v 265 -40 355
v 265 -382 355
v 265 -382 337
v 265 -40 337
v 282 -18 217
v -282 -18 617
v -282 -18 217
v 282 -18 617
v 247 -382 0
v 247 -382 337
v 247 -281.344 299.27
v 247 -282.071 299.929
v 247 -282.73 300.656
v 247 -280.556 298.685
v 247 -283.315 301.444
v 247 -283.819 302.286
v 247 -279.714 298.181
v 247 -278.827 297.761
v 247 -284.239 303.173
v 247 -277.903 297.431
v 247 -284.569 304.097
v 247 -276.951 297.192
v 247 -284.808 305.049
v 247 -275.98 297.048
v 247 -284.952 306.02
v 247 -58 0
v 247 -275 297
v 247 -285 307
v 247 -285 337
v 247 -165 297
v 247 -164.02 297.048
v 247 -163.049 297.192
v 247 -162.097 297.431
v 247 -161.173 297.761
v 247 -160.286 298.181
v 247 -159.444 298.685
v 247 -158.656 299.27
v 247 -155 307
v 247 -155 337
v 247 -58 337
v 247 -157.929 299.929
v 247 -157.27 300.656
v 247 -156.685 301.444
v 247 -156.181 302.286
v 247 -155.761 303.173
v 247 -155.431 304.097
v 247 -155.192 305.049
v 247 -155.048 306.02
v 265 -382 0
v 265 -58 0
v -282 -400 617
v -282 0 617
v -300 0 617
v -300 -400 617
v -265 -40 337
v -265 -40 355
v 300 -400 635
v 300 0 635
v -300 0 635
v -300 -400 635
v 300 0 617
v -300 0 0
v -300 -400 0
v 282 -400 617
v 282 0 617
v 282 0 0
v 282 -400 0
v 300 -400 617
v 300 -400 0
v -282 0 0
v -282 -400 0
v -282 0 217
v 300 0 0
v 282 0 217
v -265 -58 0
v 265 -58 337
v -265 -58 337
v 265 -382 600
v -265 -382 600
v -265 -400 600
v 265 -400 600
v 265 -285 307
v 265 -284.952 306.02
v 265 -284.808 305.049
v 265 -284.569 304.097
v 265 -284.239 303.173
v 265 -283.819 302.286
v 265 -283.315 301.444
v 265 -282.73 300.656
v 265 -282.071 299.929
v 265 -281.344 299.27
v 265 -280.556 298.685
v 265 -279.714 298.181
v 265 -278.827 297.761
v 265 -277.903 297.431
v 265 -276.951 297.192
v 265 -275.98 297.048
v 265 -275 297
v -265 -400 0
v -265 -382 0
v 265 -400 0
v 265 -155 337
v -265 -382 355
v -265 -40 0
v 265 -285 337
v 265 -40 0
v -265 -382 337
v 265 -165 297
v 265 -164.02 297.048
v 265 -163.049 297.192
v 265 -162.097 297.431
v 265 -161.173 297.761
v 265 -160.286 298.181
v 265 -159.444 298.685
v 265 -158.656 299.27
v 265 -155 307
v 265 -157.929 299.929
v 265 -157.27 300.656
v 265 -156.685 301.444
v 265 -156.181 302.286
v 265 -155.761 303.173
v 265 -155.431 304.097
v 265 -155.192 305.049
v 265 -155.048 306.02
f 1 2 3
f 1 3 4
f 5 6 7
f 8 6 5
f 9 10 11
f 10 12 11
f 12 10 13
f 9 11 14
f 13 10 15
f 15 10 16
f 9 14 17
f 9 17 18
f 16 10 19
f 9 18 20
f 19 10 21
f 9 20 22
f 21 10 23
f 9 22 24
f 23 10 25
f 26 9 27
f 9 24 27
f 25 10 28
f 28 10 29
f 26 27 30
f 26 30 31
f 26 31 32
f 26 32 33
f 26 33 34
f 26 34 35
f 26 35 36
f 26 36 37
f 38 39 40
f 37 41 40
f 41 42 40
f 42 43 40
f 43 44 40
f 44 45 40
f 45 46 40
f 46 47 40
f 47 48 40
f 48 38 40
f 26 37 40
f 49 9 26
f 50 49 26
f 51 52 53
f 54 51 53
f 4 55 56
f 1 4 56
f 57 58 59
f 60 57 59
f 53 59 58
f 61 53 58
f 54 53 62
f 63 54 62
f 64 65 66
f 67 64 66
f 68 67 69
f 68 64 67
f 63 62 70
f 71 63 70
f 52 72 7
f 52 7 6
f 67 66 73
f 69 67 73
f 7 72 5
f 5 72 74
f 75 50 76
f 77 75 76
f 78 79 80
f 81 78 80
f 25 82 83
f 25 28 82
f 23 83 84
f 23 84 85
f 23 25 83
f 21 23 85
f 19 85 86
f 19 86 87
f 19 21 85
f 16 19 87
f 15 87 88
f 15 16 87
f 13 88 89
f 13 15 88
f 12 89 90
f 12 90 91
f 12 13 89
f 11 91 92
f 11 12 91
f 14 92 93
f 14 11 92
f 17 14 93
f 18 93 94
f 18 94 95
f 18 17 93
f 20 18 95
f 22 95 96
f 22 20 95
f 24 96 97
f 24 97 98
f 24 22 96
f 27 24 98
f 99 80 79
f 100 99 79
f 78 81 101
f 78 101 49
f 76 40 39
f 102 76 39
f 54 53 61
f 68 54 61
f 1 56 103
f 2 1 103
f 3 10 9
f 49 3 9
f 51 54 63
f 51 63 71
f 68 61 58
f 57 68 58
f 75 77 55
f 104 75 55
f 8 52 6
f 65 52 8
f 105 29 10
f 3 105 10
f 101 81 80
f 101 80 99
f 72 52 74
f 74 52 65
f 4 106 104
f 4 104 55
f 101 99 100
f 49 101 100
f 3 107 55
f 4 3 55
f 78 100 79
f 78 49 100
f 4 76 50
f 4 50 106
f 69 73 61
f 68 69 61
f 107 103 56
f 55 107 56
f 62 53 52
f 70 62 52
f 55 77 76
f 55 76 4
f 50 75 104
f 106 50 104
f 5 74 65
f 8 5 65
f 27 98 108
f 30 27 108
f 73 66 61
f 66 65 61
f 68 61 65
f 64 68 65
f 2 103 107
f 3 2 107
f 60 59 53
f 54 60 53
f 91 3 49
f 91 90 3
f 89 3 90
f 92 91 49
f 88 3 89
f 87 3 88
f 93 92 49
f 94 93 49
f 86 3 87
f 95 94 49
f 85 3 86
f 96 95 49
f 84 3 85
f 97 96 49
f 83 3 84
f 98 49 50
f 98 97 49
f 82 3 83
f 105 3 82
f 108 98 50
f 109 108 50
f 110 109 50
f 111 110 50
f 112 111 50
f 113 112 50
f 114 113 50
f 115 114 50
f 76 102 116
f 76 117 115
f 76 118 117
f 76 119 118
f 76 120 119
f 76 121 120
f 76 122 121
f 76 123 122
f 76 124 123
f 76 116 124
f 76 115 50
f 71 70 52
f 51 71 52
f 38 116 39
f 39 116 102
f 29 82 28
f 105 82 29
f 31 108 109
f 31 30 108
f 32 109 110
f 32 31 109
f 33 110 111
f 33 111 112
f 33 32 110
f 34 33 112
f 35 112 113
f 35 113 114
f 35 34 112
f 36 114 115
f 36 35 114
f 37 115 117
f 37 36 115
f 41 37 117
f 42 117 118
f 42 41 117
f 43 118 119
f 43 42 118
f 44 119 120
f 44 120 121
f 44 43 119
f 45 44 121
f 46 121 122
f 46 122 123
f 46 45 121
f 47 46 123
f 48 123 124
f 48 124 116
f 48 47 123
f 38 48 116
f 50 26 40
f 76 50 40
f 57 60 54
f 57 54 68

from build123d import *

# Parameters (mm, degrees)
F1_DEPTH  = 400
F2_DEPTH  = 400
F3_DEPTH  = 400
F0_W      = 564
F0_H      = 400
F4_DEPTH  = 18
F6_DEPTH  = 265
F7_DEPTH  = 265
F5_W      = 18
F5_H      = 337
F8_DEPTH  = 265
F9_START  = 247
F5_H_2    = 50
F9_DEPTH  = 18
F10_W     = 130
F10_H     = 40
F11_DEPTH = 18
F12_R     = 10


with BuildPart() as f1:
    # F0 (on Front) → F1 (new body)
    with BuildSketch(Plane.XZ):
        Polygon((-282, 0), (-282, 217), (-282, 617), (-300, 617), (-300, 0), align=None)
    extrude(amount=F1_DEPTH)


with BuildPart() as f2:
    # F0 (on Front) → F2 (new body)
    with BuildSketch(Plane.XZ):
        Polygon((282, 217), (282, 0), (300, 0), (300, 617), (282, 617), align=None)
    extrude(amount=F2_DEPTH)


with BuildPart() as f3:
    # F0 (on Front) → F3 (new body)
    with BuildSketch(Plane.XZ):
        Polygon((282, 617), (300, 617), (300, 635), (-300, 635), (-300, 617), (-282, 617), align=None)
    extrude(amount=F3_DEPTH)


with BuildPart() as f4:
    # F0 (on Front) → F4 (new body)
    with BuildSketch(Plane.XZ):
        with Locations((0, 417)):
            Rectangle(F0_W, F0_H)
    extrude(amount=F4_DEPTH)


with BuildPart() as f6:
    # F5 (on Right) → F6 (new body, symmetric)
    with BuildSketch(Plane.YZ):
        Polygon((-382, 600), (-400, 600), (-400, 0), (-382, 0), (-382, 287), (-382, 337), (-382, 355), align=None)
    extrude(amount=F6_DEPTH, both=True)


with BuildPart() as f7:
    # F5 (on Right) → F7 (new body, symmetric)
    with BuildSketch(Plane.YZ):
        Polygon((-40, 355), (-382, 355), (-382, 337), (-364, 337), (-58, 337), (-40, 337), align=None)
    extrude(amount=F7_DEPTH, both=True)


with BuildPart() as f8:
    # F5 (on Right) → F8 (new body, symmetric)
    with BuildSketch(Plane.YZ):
        with Locations((-49, 168.5)):
            Rectangle(F5_W, F5_H)
    extrude(amount=F8_DEPTH, both=True)


with BuildPart() as f9:
    # F5 (on Right) → F9 (new body)
    with BuildSketch(Plane.YZ.offset(F9_START)):
        Polygon((-382, 287), (-382, 0), (-58, 0), (-58, 337), (-364, 337), (-364, 287), align=None)
        with Locations((-373, 312)):
            Rectangle(F5_W, F5_H_2)
    extrude(amount=F9_DEPTH)

    # F10 (on face) → F11 (cut, through all)
    with BuildSketch(Plane.YZ.offset(265)):
        with Locations((-220, 317)):
            Rectangle(F10_W, F10_H)
    extrude(amount=-F11_DEPTH, mode=Mode.SUBTRACT)

    # F12
    f12_edges = [f9.edges().sort_by_distance(p)[0] for p in [
        (256, -285, 297),
        (256, -155, 297),
    ]]
    fillet(f12_edges, radius=F12_R)


solid = Compound([f1.part, f2.part, f3.part, f4.part, f6.part, f7.part, f8.part, f9.part])
